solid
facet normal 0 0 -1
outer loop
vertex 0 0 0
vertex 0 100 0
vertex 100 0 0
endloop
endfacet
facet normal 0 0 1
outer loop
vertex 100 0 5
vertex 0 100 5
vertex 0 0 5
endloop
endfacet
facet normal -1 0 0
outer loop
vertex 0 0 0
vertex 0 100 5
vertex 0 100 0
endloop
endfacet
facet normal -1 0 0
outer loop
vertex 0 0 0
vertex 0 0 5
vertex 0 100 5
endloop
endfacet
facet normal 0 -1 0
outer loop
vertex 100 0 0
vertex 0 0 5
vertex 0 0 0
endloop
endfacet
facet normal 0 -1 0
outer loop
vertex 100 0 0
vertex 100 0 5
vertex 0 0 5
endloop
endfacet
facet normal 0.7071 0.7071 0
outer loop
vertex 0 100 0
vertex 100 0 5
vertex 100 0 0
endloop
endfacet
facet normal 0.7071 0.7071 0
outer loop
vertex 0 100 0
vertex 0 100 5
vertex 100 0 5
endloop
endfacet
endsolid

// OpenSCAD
// file: math.scad
///< Math scad module


///< Find the hypotenuse from two sides of a right triangle
function hyp_from_sides( a, b ) = sqrt( pow( a, 2 ) + pow( b, 2 ) );

///< Find equal sides from hypotenuse of a right triangle
function sides_from_hyp(h) = sqrt( pow( h, 2 ) / 2 );

///< Find A from hypotenuse and B
function a_from_hb( h, b ) = sqrt( pow( h, 2 ) - pow( b, 2 ) );

function dist_2d( pt2, pt1 ) = sqrt(pow(( pt2[0]-pt1[0] ),2) + pow(( pt2[1]-pt1[1]),2) );

function mid_pt_2d( pt2, pt1 ) = [( pt1[0]+pt2[0] )/2, ( pt1[1]+pt2[1] )/2, 0 ];
///< Test for math functions

A = 3;
B = 4;
echo("Given A=", A, "and B=", B );
H = hyp_from_sides( A, B );
echo("Hypotenuse=", H );
echo("Calc Correct = ", (H == 5) );

echo("Given H=", H, " which is a hypotenuse with equal sides" );
echo( "the sides=", sides_from_hyp( H ) );

echo("Given H=", H, "B=", 4 );
echo("A=", a_from_hb( H, 4 ) );

echo("Distance from [-1,1] and [3,4] = ", dist_2d( [-1,1],[3,4]) );
// main file
///< Triangle module
use <math.scad>

p1 = [   0,   0 ];
p2 = [ 100,   0 ];
p3 = [   0, 100 ];

     
triangle( p1, p2, p3, h = 5 );

module triangle(pt1, pt2, pt3, h=1) {
     color ("red") linear_extrude (height=h)
	  polygon(points=[ p1, p2, p3 ] );
}
